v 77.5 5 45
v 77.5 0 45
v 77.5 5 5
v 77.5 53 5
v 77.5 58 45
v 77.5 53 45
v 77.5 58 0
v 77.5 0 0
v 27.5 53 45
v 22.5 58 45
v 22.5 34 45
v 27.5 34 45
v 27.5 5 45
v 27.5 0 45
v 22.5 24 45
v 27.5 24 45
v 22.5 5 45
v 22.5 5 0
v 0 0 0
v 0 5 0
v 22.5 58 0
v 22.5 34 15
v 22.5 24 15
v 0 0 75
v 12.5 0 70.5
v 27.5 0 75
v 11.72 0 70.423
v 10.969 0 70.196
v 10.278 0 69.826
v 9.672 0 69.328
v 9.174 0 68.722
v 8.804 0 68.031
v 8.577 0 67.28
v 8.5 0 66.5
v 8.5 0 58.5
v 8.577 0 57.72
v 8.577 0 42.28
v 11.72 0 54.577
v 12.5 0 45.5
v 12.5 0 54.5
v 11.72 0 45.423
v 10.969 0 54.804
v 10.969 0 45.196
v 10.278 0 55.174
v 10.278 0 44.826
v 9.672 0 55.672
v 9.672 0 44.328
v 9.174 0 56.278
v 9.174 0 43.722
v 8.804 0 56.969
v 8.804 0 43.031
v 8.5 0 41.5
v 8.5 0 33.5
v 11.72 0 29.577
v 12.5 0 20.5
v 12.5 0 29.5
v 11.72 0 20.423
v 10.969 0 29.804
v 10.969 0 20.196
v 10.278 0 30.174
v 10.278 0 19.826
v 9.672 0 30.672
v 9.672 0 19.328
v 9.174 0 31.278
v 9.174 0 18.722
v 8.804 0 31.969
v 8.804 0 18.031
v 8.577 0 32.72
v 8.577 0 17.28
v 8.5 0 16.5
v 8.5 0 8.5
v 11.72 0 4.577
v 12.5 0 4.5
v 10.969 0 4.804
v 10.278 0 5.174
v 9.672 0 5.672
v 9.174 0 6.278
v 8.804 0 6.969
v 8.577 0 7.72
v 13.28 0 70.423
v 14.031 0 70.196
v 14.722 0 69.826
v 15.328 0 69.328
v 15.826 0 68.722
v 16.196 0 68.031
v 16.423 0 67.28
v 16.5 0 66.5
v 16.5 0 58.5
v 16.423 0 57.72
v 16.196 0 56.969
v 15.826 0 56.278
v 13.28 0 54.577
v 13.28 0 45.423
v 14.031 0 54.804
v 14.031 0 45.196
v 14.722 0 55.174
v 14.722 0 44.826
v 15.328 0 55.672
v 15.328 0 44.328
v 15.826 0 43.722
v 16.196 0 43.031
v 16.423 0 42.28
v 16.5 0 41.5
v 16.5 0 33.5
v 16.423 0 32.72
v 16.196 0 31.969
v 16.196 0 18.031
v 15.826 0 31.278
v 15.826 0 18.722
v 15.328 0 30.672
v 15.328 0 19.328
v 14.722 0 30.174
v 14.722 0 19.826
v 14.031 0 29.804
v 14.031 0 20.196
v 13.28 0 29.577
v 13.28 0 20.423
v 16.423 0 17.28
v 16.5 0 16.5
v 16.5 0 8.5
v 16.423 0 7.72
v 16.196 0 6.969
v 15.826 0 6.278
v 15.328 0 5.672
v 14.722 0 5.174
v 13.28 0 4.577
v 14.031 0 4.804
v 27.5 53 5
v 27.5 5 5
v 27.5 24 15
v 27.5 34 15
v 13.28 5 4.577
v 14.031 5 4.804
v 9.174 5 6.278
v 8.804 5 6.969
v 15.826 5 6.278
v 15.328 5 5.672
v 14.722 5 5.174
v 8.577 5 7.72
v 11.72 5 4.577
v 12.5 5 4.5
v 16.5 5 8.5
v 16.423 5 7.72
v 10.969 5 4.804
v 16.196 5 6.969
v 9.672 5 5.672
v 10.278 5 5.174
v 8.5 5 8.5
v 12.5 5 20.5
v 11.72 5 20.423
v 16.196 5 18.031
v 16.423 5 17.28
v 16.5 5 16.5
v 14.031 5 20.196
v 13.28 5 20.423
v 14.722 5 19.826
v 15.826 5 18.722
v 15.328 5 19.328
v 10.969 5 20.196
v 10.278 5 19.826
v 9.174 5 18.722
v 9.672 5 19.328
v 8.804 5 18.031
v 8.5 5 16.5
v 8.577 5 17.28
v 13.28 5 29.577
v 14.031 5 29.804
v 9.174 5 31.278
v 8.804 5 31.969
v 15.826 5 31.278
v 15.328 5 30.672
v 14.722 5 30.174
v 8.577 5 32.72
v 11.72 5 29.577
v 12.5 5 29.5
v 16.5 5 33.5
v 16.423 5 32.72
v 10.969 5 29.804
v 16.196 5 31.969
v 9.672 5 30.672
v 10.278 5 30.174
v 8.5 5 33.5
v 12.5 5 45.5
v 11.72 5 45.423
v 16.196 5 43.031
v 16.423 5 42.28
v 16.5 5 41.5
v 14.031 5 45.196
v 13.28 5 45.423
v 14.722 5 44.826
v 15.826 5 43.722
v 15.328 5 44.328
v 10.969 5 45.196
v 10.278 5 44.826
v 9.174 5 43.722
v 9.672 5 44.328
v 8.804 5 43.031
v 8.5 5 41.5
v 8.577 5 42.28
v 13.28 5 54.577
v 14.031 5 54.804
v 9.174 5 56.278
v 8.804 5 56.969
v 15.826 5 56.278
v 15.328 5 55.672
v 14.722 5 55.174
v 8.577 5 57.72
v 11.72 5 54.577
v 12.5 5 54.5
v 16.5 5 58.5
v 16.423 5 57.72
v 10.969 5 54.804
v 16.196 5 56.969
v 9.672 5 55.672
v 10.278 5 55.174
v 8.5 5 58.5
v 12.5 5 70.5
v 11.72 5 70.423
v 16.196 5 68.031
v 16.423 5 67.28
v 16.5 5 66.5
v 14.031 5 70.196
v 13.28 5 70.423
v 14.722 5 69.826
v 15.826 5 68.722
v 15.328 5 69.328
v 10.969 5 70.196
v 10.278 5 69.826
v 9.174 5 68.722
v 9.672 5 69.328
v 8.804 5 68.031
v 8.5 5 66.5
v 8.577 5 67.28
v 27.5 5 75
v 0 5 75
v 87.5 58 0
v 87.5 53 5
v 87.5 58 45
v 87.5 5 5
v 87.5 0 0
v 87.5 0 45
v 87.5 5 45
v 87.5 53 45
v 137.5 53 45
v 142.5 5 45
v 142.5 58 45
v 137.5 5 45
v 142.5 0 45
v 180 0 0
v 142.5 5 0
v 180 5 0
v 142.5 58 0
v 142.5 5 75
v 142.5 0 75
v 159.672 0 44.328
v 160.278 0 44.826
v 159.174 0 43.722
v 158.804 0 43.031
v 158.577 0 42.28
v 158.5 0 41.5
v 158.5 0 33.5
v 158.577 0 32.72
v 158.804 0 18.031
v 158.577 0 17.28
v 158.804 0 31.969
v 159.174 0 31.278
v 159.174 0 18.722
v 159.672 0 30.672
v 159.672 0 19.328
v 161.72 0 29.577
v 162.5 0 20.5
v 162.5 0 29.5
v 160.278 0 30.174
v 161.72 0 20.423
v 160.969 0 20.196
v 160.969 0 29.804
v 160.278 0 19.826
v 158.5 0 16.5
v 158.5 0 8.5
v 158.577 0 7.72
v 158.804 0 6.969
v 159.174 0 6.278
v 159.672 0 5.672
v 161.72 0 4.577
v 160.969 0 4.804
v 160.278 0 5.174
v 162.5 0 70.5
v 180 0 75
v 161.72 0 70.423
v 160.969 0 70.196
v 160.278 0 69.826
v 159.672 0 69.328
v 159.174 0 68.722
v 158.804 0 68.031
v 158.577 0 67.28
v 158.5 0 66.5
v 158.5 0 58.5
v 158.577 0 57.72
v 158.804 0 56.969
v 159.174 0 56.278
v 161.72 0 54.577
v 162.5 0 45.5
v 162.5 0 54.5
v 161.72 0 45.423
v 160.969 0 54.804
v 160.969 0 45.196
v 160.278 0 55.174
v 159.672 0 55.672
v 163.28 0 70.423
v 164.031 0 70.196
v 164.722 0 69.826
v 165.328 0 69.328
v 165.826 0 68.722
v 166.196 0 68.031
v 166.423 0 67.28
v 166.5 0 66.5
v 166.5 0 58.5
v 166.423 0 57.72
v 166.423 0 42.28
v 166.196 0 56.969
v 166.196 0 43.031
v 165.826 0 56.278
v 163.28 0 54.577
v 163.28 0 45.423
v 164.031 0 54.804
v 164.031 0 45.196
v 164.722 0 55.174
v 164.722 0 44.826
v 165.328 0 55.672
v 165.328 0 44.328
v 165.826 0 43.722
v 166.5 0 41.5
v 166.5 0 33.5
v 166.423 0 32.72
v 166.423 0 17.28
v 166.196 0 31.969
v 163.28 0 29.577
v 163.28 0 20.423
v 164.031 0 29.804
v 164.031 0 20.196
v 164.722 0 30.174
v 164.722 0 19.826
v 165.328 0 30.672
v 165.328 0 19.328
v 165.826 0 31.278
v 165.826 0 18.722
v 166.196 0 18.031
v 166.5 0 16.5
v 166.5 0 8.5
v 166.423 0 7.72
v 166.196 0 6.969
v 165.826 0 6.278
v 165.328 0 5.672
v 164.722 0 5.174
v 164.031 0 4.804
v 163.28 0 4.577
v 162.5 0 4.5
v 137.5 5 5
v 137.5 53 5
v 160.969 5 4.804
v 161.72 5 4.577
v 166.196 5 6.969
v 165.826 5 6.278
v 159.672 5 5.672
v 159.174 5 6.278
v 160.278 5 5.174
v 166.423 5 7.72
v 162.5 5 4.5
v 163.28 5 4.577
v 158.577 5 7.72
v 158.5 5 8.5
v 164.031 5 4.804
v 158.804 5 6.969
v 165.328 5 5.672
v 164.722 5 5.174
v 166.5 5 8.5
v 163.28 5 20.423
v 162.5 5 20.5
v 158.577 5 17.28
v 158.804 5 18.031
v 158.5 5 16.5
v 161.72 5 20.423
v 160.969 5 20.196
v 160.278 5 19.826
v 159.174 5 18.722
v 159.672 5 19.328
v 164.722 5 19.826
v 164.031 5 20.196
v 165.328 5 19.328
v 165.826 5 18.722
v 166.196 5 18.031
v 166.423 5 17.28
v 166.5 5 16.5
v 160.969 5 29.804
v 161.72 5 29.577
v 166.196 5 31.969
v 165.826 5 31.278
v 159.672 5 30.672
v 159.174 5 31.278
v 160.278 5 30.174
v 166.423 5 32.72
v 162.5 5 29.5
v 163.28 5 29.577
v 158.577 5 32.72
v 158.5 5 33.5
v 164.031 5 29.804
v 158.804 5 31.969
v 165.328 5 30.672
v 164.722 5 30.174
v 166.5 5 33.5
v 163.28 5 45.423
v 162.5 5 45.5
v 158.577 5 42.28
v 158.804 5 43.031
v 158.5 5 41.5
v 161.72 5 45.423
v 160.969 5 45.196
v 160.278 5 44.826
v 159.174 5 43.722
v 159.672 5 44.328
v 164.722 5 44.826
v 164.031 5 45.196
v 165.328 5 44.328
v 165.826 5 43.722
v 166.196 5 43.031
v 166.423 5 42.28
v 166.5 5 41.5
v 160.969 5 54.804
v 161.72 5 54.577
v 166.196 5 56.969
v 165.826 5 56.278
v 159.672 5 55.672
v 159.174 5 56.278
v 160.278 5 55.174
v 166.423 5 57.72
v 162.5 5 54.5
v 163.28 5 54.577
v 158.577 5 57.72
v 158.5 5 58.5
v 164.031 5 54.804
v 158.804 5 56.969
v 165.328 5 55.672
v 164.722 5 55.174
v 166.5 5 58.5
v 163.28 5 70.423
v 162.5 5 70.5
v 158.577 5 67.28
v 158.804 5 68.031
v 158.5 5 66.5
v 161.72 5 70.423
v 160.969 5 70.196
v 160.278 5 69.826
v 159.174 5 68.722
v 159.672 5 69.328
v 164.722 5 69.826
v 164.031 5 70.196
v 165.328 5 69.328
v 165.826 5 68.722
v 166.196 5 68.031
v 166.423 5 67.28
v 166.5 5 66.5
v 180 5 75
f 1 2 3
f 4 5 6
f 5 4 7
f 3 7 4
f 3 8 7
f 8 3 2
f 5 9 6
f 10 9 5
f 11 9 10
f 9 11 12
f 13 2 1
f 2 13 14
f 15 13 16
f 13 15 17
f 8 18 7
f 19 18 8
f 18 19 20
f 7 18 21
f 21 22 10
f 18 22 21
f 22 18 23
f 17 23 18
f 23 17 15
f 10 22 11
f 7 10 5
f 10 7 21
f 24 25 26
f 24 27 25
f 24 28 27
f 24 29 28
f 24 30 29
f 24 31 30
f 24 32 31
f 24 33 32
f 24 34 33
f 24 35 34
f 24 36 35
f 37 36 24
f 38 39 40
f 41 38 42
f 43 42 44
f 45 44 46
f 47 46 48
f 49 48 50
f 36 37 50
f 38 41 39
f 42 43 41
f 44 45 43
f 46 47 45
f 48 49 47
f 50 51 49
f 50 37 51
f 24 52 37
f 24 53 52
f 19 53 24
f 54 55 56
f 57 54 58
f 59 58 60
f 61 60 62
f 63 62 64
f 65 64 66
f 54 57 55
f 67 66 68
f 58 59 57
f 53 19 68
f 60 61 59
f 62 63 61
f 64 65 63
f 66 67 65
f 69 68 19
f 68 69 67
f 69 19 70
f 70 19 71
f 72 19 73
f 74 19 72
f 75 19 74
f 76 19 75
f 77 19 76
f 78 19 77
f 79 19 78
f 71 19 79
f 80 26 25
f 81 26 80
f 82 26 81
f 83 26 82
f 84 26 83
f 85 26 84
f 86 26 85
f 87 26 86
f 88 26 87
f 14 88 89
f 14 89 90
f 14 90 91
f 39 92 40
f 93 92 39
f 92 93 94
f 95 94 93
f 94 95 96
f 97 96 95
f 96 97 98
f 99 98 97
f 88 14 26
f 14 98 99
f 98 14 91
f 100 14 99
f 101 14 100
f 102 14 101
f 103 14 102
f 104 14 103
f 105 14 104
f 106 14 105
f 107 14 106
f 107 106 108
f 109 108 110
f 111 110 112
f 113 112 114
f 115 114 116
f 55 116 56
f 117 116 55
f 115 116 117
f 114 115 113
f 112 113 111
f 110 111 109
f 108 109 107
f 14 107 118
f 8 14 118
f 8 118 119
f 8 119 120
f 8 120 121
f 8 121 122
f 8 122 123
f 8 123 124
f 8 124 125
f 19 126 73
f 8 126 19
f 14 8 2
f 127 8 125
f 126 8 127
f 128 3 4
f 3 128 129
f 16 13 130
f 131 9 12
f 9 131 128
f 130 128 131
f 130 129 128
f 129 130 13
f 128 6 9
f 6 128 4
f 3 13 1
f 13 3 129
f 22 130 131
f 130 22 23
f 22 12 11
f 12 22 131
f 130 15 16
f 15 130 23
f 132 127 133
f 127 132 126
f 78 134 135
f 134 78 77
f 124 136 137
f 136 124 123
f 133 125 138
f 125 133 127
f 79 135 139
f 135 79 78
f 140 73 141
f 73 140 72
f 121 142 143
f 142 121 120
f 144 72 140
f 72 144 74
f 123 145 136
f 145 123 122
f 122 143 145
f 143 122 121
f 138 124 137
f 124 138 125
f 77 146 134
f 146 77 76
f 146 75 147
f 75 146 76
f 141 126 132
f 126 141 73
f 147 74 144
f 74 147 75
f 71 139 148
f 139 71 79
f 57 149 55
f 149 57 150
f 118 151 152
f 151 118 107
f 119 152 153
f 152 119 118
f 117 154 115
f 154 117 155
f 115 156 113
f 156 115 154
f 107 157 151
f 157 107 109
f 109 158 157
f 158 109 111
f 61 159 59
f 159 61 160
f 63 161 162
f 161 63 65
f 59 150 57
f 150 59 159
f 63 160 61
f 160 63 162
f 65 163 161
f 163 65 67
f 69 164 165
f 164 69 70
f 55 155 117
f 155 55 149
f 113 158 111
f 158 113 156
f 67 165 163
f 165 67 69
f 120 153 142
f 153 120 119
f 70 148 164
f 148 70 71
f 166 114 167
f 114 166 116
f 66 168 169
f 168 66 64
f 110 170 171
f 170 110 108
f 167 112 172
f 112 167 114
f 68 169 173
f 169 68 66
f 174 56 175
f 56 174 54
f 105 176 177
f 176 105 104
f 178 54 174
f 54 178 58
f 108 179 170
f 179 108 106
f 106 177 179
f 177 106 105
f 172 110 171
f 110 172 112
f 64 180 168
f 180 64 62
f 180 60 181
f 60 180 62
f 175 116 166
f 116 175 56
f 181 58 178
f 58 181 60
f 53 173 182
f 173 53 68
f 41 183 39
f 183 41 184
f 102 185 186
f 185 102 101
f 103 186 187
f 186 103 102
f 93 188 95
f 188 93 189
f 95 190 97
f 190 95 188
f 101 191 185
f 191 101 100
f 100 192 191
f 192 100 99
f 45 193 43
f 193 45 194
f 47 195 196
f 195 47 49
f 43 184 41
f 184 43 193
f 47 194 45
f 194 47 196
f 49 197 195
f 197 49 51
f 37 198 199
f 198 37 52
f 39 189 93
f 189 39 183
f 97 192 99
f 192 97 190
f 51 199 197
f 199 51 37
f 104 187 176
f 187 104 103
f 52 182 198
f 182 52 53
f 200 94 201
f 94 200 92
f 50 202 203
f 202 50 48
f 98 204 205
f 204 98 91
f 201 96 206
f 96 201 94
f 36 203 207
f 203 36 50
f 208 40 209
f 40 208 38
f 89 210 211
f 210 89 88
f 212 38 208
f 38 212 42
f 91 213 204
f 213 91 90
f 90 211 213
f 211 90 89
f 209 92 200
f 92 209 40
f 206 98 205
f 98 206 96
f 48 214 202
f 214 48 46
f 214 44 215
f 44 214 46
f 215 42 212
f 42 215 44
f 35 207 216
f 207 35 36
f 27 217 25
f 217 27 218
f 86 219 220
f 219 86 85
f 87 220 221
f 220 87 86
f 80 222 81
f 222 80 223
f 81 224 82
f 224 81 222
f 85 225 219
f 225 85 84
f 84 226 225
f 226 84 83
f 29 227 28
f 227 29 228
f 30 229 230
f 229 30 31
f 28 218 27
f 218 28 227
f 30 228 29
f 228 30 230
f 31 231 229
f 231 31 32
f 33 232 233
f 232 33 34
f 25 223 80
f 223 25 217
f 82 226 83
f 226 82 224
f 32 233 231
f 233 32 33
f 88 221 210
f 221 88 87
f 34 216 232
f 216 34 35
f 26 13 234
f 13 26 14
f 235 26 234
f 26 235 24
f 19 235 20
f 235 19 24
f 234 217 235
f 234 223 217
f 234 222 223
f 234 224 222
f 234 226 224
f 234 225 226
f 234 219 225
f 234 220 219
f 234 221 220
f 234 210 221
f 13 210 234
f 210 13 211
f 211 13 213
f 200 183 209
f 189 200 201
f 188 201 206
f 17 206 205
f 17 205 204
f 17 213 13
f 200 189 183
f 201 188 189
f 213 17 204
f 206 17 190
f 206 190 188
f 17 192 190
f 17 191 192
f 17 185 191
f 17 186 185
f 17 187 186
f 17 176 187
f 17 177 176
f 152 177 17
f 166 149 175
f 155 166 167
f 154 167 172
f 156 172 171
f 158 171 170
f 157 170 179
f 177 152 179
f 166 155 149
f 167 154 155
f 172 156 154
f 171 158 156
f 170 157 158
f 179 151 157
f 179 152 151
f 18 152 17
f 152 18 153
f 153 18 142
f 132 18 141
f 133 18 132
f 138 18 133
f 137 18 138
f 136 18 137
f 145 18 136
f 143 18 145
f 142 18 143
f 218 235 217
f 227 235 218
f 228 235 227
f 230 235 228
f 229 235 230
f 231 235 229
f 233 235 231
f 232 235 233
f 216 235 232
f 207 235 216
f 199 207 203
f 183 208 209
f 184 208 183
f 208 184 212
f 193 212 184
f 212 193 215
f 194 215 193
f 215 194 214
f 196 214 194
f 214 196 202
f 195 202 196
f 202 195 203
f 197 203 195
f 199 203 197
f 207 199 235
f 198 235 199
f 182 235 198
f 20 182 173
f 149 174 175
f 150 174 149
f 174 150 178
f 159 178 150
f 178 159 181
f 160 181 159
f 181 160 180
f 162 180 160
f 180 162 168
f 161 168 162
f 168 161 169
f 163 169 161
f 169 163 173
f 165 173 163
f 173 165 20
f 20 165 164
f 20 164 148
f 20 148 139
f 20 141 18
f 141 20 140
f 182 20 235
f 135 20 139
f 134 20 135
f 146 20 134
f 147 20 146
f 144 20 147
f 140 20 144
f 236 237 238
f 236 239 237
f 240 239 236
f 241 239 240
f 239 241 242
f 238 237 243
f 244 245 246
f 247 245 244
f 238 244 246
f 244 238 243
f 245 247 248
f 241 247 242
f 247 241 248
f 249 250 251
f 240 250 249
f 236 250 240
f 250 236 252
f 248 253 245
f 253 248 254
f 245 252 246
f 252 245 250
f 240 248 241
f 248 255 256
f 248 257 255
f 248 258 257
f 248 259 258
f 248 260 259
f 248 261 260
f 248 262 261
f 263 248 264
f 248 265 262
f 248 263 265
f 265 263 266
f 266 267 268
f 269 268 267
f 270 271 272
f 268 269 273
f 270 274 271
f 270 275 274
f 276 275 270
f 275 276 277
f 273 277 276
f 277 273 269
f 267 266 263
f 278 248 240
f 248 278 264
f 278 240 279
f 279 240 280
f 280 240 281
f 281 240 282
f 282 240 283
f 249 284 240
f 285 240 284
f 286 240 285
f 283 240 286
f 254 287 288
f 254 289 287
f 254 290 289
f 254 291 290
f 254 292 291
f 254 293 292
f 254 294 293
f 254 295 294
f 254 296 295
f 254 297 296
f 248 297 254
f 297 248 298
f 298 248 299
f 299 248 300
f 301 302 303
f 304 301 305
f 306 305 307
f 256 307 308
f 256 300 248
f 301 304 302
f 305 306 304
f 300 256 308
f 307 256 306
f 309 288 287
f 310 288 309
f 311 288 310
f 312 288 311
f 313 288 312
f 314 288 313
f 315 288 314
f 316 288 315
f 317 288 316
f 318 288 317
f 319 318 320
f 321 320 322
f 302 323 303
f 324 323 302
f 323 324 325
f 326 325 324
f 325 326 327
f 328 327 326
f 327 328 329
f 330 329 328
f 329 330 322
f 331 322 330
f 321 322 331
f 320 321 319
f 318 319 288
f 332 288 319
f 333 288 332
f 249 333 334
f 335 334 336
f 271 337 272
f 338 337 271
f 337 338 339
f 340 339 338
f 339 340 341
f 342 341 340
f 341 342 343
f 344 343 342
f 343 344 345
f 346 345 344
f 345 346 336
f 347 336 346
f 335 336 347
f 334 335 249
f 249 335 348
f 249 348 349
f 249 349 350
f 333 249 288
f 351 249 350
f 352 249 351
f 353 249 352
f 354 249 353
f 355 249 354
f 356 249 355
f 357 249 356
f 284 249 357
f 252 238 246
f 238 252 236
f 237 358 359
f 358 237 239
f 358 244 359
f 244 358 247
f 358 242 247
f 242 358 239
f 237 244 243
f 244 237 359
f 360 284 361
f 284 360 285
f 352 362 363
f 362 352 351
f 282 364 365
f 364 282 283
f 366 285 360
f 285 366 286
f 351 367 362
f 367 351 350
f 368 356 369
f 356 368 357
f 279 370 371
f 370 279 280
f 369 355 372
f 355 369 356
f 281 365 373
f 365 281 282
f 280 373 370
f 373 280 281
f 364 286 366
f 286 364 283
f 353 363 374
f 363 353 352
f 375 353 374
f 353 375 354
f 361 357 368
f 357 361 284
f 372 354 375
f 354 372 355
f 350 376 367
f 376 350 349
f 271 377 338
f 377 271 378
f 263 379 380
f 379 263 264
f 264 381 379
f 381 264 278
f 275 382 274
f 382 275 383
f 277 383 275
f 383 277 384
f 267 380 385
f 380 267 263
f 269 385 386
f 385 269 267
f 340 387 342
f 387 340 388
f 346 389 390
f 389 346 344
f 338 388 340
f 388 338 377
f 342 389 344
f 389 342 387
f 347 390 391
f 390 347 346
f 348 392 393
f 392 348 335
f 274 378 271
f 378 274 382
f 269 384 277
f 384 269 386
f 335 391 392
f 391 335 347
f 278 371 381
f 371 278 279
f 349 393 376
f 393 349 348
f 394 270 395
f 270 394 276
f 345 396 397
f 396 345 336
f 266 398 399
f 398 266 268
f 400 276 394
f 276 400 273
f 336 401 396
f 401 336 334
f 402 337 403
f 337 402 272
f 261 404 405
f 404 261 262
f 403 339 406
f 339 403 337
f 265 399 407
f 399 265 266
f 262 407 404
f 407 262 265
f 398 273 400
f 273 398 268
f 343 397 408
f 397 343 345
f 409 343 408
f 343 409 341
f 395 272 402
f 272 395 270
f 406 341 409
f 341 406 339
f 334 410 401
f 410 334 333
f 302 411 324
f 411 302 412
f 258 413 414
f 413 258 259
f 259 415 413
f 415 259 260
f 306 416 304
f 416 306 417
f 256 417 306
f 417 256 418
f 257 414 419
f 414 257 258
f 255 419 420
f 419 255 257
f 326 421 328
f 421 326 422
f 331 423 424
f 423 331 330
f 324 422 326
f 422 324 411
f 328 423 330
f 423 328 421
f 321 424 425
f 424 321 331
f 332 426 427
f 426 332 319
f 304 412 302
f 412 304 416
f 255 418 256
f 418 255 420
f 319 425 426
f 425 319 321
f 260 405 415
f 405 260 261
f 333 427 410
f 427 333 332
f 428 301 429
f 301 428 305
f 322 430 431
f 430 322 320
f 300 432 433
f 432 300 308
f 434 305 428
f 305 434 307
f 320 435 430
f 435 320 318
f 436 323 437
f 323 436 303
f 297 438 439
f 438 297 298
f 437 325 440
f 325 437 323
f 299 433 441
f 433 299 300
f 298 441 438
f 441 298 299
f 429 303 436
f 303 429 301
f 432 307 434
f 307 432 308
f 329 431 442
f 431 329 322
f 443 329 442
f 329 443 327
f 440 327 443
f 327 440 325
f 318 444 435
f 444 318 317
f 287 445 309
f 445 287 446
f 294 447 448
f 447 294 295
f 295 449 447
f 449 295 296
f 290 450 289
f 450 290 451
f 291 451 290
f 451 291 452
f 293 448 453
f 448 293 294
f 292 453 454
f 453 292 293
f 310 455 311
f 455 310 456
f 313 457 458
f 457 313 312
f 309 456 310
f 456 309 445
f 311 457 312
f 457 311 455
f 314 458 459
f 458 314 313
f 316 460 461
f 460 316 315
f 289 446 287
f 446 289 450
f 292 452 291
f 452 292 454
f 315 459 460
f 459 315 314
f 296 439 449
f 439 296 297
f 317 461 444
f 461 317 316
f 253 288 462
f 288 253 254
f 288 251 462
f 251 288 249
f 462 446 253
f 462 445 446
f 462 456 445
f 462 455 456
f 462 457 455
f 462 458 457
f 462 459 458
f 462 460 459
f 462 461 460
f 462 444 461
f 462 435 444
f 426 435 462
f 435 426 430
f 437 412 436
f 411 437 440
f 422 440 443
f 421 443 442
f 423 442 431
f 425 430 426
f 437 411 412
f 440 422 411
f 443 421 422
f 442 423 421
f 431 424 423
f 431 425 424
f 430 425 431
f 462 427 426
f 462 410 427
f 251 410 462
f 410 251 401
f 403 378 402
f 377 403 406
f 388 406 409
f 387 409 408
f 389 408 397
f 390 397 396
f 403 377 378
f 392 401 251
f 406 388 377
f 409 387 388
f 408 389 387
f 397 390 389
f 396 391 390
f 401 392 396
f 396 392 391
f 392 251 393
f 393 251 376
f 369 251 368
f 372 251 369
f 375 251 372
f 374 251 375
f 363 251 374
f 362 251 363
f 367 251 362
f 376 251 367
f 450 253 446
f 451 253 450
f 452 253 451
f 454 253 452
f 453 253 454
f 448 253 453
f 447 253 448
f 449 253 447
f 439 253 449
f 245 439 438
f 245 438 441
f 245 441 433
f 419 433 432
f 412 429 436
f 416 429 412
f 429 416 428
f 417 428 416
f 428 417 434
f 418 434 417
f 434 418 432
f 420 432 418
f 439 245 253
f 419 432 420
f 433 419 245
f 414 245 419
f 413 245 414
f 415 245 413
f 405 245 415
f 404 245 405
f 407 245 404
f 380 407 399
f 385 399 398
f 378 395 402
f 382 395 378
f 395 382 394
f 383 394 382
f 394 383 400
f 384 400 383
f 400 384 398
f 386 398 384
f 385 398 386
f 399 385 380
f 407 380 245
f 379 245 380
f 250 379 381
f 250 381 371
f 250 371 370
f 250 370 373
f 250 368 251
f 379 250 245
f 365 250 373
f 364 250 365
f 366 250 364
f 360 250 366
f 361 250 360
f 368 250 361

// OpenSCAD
module left(){
    translate([35/2 + 5,0,0]) difference(){
        cube([55,58,45]);
        translate([5,5,5]) cube([50 + 0.01,48,40 + 0.01]);
        translate([-0.001, (58 - 10) / 2, 15]) cube([5 + 0.01, 10, 35]);
    }  
    difference(){ 
        cube([35/2 + 10,5,25 * 3]);  
        for(i = [25/2, 25/2 + 25, , 25/2 + 25 * 2]) {
            translate([35/2 - 5,0,i - 8/2]) rotate([90,0,0]) cylinder(d = 8, h = 12, center = true, $fn= 32);
            translate([35/2 - 5,0,i + 8/2]) rotate([90,0,0]) cylinder(d = 8, h = 12, center = true, $fn= 32);
            translate([35/2 - 5 - 8/2,-0.1,i - 8/2]) cube([8,5 + 0.2,8]);
        }
    }
}

module right(){
    translate([35/2 + 20,0,0]) difference(){
        cube([55,58,45]);
        translate([5,5,5]) cube([50 + 0.01,48,40 + 0.01]);
    }  
    translate([0, 58 - 5, 0]) difference(){ 
        cube([35/2 + 20,5,25 * 3]);  
        for(i = [25/2, 25/2 + 25, , 25/2 + 25 * 2]) {
            translate([35/2,0,i - 8/2]) rotate([90,0,0]) cylinder(d = 8, h = 12, center = true, $fn= 32);
            translate([35/2,0,i + 8/2]) rotate([90,0,0]) cylinder(d = 8, h = 12, center = true, $fn= 32);
            translate([35/2 - 8/2,-0.1,i - 8/2]) cube([8,5 + 0.2,8]);
        }
    }
}

left();
translate([180,58,0]) rotate([0,0,180]) right();
